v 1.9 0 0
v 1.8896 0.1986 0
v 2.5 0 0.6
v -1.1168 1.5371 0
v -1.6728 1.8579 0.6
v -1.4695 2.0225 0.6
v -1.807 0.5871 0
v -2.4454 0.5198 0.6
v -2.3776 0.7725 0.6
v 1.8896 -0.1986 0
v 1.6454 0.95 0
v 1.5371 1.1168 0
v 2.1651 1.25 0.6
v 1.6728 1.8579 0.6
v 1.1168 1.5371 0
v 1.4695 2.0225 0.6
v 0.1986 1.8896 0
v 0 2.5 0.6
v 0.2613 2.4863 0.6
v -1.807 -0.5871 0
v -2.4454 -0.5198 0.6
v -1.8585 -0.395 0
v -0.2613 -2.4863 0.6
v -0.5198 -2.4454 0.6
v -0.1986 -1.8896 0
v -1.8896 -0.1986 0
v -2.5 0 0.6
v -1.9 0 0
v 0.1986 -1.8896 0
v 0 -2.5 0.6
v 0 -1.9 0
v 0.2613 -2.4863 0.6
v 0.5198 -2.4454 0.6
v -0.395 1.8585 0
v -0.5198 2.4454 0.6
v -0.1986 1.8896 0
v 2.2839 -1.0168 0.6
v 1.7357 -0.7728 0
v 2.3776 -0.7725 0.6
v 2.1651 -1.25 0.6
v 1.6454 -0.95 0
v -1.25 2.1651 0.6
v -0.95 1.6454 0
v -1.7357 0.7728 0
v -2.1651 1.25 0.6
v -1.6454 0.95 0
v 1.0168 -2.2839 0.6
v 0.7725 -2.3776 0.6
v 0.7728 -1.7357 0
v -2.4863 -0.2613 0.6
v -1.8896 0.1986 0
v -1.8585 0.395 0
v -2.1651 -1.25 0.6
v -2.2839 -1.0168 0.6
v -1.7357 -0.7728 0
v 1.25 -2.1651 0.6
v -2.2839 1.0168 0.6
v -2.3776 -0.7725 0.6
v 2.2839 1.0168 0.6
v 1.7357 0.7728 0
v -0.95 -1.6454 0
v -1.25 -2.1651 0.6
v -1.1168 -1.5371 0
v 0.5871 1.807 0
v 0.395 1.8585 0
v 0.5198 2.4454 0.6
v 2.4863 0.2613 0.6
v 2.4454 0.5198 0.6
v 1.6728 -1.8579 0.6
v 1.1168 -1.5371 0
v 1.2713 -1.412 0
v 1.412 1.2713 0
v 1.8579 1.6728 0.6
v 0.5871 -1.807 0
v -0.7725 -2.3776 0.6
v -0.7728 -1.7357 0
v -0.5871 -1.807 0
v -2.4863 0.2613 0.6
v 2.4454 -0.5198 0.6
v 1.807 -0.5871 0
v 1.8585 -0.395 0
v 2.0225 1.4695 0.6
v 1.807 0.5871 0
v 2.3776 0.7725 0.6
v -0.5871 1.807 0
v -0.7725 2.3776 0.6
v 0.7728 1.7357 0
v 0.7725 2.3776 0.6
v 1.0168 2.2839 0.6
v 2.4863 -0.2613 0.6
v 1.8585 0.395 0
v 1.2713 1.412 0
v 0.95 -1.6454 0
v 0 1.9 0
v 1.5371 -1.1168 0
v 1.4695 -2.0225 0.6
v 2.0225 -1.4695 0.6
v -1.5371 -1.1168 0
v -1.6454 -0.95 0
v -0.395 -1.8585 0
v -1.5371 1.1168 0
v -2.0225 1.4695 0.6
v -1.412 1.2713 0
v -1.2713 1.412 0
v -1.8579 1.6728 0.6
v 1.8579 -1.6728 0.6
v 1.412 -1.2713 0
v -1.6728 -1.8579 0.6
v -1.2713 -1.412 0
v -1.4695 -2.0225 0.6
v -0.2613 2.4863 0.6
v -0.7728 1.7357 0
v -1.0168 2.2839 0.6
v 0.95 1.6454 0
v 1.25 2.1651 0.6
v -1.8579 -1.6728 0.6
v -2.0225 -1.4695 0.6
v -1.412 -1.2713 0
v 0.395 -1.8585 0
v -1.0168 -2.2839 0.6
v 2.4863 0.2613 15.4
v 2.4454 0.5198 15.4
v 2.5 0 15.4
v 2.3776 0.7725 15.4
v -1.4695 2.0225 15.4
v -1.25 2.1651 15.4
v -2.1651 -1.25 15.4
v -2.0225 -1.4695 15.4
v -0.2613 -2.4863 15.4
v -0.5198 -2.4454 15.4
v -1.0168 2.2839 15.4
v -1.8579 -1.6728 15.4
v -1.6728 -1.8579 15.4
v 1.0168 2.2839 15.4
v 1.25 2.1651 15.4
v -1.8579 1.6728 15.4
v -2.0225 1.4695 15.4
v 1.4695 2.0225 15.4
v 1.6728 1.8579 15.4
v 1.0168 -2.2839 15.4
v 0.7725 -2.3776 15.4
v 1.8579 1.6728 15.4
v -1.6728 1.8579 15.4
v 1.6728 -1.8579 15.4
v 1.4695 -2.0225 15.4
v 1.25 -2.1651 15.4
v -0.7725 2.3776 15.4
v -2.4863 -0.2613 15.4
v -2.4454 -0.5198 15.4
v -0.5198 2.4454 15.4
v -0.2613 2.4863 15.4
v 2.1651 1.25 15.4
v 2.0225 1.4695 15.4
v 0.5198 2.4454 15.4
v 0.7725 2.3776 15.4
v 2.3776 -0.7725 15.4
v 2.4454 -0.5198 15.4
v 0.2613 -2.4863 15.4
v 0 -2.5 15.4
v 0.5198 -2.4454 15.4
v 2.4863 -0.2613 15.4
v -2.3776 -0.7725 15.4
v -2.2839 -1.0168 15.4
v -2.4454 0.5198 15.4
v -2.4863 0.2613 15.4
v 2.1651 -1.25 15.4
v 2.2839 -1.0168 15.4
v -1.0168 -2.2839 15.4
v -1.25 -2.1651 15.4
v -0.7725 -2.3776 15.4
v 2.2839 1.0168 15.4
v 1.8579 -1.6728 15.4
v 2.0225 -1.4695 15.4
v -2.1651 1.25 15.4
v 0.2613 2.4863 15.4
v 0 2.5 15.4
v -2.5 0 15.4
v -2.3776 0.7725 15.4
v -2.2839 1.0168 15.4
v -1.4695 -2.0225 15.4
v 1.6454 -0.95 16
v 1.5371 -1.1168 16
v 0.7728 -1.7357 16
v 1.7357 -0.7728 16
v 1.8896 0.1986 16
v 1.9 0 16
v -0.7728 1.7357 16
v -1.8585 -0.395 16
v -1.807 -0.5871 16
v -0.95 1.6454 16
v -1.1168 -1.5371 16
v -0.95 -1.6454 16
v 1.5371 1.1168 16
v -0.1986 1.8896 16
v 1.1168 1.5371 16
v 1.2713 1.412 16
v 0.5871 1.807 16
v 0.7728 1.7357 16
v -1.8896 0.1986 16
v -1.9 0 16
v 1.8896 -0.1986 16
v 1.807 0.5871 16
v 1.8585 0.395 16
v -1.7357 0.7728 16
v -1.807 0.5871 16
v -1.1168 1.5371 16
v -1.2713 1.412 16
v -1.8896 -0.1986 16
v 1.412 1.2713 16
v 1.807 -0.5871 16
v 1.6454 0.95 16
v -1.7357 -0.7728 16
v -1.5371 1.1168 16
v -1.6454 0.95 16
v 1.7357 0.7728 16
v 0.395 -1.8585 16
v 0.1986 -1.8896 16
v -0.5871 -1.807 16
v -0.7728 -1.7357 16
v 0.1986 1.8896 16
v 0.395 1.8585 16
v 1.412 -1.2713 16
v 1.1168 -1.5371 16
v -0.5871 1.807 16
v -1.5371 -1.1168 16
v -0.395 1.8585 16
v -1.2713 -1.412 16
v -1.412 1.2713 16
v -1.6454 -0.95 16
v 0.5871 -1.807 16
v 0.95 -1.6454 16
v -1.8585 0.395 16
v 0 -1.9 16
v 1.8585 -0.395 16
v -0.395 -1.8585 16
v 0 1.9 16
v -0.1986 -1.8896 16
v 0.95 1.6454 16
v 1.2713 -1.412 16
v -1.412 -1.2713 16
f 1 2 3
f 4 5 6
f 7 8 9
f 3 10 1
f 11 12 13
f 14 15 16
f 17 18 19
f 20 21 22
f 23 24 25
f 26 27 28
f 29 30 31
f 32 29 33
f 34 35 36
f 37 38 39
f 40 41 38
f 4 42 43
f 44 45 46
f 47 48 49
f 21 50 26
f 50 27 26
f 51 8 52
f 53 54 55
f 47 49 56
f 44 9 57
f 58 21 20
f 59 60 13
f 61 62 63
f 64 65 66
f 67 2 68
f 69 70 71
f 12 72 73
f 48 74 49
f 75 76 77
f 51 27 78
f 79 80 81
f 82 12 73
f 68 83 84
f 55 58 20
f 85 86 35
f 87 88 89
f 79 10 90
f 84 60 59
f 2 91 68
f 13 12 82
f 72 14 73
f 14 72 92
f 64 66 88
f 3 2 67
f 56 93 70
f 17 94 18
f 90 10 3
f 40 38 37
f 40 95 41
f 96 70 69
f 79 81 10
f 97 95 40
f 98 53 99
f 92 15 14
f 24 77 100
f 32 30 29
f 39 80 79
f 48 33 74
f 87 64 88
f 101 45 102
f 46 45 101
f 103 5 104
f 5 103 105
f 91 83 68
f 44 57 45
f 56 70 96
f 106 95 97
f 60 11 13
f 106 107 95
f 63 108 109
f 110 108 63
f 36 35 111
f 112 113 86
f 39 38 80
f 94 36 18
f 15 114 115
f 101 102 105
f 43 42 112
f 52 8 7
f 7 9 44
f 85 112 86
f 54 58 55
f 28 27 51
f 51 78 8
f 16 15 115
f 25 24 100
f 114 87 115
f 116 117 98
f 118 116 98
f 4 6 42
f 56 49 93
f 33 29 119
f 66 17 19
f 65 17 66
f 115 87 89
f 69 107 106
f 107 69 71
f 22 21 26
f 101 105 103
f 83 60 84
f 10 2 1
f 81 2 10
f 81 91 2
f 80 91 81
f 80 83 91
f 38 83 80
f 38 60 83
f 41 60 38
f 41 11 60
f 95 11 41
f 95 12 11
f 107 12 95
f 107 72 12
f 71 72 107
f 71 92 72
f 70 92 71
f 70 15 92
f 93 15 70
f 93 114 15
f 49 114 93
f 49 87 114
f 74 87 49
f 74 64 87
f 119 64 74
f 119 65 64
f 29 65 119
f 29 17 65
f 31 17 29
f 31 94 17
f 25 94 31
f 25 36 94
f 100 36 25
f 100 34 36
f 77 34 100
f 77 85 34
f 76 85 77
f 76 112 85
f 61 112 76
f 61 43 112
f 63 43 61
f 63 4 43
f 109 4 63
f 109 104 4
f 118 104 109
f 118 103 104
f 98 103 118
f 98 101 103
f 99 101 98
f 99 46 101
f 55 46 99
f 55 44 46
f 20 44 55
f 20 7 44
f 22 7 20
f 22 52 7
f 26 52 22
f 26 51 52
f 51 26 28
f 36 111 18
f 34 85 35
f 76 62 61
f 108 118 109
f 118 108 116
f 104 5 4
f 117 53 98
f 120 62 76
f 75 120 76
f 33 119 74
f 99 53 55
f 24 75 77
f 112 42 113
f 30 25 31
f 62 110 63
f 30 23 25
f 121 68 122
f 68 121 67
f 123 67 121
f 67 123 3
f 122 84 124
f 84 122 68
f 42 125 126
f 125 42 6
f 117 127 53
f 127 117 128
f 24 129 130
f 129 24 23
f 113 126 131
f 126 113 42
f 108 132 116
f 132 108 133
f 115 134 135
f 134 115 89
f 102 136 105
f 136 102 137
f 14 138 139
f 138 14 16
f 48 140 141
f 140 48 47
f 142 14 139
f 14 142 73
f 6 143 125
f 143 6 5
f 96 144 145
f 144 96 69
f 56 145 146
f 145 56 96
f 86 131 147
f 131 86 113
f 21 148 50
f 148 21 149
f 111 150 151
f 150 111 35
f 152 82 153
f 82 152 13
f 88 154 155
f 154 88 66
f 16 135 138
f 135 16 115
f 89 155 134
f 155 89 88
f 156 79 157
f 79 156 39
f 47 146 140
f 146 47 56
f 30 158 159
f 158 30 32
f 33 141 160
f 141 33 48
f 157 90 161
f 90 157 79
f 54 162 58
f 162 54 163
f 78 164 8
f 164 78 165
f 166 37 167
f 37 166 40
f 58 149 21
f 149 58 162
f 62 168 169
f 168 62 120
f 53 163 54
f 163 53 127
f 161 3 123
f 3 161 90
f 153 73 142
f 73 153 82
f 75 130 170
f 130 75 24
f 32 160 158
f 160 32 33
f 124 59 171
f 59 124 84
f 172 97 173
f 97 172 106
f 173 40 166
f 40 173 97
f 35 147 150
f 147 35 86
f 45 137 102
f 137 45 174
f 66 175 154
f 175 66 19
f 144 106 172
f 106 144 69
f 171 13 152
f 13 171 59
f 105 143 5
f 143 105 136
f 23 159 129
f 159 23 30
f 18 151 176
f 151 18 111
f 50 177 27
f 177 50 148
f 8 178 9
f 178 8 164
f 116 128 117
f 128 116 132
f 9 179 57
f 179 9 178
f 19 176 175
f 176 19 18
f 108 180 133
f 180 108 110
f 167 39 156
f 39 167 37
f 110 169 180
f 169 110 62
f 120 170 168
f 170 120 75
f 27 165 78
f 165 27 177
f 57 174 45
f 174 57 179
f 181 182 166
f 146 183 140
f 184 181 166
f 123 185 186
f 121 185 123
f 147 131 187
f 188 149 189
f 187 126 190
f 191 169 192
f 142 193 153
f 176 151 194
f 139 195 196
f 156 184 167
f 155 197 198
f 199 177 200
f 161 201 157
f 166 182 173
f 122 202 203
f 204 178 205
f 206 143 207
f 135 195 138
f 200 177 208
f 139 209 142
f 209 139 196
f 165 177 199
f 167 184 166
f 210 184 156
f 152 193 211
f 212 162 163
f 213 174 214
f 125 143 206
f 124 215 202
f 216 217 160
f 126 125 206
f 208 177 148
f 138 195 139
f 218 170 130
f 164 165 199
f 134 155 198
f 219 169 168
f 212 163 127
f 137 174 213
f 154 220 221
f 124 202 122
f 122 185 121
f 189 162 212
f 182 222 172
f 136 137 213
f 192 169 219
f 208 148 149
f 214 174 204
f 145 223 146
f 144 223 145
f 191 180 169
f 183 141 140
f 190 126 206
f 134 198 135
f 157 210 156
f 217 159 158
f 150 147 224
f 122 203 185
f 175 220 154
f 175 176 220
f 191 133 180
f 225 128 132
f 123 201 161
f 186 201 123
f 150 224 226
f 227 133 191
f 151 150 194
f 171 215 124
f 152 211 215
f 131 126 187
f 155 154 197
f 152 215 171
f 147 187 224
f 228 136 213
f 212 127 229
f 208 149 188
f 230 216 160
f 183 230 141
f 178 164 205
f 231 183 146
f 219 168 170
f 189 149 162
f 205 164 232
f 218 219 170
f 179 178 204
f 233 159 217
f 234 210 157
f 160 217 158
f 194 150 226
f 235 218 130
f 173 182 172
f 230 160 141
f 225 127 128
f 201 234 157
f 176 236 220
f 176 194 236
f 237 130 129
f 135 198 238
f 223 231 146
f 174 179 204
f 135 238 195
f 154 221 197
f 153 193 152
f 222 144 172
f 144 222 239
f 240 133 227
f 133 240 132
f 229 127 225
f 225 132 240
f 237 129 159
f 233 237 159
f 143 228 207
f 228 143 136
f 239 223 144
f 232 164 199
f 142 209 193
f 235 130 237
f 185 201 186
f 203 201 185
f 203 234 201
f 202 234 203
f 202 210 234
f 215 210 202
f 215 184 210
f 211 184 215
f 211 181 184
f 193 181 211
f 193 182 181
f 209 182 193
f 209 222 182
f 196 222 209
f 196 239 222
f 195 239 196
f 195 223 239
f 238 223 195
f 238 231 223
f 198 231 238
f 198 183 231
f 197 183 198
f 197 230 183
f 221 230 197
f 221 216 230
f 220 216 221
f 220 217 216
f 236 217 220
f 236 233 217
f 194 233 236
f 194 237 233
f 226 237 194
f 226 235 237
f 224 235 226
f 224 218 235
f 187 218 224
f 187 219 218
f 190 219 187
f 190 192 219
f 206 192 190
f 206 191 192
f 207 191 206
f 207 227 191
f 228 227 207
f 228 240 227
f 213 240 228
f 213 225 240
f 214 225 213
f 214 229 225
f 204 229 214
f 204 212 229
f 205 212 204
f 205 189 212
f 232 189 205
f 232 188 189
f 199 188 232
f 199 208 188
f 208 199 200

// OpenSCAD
// Chamfered dowel pin.
$fn = 60;
eps = 0.02;
diameter = 5;
length = 16;
chamfer = 0.6;
union() {
    cylinder(d1 = diameter - 2 * chamfer, d2 = diameter, h = chamfer);
    translate([0, 0, chamfer]) cylinder(d = diameter, h = length - 2 * chamfer);
    translate([0, 0, length - chamfer]) cylinder(d1 = diameter, d2 = diameter - 2 * chamfer, h = chamfer);
}
